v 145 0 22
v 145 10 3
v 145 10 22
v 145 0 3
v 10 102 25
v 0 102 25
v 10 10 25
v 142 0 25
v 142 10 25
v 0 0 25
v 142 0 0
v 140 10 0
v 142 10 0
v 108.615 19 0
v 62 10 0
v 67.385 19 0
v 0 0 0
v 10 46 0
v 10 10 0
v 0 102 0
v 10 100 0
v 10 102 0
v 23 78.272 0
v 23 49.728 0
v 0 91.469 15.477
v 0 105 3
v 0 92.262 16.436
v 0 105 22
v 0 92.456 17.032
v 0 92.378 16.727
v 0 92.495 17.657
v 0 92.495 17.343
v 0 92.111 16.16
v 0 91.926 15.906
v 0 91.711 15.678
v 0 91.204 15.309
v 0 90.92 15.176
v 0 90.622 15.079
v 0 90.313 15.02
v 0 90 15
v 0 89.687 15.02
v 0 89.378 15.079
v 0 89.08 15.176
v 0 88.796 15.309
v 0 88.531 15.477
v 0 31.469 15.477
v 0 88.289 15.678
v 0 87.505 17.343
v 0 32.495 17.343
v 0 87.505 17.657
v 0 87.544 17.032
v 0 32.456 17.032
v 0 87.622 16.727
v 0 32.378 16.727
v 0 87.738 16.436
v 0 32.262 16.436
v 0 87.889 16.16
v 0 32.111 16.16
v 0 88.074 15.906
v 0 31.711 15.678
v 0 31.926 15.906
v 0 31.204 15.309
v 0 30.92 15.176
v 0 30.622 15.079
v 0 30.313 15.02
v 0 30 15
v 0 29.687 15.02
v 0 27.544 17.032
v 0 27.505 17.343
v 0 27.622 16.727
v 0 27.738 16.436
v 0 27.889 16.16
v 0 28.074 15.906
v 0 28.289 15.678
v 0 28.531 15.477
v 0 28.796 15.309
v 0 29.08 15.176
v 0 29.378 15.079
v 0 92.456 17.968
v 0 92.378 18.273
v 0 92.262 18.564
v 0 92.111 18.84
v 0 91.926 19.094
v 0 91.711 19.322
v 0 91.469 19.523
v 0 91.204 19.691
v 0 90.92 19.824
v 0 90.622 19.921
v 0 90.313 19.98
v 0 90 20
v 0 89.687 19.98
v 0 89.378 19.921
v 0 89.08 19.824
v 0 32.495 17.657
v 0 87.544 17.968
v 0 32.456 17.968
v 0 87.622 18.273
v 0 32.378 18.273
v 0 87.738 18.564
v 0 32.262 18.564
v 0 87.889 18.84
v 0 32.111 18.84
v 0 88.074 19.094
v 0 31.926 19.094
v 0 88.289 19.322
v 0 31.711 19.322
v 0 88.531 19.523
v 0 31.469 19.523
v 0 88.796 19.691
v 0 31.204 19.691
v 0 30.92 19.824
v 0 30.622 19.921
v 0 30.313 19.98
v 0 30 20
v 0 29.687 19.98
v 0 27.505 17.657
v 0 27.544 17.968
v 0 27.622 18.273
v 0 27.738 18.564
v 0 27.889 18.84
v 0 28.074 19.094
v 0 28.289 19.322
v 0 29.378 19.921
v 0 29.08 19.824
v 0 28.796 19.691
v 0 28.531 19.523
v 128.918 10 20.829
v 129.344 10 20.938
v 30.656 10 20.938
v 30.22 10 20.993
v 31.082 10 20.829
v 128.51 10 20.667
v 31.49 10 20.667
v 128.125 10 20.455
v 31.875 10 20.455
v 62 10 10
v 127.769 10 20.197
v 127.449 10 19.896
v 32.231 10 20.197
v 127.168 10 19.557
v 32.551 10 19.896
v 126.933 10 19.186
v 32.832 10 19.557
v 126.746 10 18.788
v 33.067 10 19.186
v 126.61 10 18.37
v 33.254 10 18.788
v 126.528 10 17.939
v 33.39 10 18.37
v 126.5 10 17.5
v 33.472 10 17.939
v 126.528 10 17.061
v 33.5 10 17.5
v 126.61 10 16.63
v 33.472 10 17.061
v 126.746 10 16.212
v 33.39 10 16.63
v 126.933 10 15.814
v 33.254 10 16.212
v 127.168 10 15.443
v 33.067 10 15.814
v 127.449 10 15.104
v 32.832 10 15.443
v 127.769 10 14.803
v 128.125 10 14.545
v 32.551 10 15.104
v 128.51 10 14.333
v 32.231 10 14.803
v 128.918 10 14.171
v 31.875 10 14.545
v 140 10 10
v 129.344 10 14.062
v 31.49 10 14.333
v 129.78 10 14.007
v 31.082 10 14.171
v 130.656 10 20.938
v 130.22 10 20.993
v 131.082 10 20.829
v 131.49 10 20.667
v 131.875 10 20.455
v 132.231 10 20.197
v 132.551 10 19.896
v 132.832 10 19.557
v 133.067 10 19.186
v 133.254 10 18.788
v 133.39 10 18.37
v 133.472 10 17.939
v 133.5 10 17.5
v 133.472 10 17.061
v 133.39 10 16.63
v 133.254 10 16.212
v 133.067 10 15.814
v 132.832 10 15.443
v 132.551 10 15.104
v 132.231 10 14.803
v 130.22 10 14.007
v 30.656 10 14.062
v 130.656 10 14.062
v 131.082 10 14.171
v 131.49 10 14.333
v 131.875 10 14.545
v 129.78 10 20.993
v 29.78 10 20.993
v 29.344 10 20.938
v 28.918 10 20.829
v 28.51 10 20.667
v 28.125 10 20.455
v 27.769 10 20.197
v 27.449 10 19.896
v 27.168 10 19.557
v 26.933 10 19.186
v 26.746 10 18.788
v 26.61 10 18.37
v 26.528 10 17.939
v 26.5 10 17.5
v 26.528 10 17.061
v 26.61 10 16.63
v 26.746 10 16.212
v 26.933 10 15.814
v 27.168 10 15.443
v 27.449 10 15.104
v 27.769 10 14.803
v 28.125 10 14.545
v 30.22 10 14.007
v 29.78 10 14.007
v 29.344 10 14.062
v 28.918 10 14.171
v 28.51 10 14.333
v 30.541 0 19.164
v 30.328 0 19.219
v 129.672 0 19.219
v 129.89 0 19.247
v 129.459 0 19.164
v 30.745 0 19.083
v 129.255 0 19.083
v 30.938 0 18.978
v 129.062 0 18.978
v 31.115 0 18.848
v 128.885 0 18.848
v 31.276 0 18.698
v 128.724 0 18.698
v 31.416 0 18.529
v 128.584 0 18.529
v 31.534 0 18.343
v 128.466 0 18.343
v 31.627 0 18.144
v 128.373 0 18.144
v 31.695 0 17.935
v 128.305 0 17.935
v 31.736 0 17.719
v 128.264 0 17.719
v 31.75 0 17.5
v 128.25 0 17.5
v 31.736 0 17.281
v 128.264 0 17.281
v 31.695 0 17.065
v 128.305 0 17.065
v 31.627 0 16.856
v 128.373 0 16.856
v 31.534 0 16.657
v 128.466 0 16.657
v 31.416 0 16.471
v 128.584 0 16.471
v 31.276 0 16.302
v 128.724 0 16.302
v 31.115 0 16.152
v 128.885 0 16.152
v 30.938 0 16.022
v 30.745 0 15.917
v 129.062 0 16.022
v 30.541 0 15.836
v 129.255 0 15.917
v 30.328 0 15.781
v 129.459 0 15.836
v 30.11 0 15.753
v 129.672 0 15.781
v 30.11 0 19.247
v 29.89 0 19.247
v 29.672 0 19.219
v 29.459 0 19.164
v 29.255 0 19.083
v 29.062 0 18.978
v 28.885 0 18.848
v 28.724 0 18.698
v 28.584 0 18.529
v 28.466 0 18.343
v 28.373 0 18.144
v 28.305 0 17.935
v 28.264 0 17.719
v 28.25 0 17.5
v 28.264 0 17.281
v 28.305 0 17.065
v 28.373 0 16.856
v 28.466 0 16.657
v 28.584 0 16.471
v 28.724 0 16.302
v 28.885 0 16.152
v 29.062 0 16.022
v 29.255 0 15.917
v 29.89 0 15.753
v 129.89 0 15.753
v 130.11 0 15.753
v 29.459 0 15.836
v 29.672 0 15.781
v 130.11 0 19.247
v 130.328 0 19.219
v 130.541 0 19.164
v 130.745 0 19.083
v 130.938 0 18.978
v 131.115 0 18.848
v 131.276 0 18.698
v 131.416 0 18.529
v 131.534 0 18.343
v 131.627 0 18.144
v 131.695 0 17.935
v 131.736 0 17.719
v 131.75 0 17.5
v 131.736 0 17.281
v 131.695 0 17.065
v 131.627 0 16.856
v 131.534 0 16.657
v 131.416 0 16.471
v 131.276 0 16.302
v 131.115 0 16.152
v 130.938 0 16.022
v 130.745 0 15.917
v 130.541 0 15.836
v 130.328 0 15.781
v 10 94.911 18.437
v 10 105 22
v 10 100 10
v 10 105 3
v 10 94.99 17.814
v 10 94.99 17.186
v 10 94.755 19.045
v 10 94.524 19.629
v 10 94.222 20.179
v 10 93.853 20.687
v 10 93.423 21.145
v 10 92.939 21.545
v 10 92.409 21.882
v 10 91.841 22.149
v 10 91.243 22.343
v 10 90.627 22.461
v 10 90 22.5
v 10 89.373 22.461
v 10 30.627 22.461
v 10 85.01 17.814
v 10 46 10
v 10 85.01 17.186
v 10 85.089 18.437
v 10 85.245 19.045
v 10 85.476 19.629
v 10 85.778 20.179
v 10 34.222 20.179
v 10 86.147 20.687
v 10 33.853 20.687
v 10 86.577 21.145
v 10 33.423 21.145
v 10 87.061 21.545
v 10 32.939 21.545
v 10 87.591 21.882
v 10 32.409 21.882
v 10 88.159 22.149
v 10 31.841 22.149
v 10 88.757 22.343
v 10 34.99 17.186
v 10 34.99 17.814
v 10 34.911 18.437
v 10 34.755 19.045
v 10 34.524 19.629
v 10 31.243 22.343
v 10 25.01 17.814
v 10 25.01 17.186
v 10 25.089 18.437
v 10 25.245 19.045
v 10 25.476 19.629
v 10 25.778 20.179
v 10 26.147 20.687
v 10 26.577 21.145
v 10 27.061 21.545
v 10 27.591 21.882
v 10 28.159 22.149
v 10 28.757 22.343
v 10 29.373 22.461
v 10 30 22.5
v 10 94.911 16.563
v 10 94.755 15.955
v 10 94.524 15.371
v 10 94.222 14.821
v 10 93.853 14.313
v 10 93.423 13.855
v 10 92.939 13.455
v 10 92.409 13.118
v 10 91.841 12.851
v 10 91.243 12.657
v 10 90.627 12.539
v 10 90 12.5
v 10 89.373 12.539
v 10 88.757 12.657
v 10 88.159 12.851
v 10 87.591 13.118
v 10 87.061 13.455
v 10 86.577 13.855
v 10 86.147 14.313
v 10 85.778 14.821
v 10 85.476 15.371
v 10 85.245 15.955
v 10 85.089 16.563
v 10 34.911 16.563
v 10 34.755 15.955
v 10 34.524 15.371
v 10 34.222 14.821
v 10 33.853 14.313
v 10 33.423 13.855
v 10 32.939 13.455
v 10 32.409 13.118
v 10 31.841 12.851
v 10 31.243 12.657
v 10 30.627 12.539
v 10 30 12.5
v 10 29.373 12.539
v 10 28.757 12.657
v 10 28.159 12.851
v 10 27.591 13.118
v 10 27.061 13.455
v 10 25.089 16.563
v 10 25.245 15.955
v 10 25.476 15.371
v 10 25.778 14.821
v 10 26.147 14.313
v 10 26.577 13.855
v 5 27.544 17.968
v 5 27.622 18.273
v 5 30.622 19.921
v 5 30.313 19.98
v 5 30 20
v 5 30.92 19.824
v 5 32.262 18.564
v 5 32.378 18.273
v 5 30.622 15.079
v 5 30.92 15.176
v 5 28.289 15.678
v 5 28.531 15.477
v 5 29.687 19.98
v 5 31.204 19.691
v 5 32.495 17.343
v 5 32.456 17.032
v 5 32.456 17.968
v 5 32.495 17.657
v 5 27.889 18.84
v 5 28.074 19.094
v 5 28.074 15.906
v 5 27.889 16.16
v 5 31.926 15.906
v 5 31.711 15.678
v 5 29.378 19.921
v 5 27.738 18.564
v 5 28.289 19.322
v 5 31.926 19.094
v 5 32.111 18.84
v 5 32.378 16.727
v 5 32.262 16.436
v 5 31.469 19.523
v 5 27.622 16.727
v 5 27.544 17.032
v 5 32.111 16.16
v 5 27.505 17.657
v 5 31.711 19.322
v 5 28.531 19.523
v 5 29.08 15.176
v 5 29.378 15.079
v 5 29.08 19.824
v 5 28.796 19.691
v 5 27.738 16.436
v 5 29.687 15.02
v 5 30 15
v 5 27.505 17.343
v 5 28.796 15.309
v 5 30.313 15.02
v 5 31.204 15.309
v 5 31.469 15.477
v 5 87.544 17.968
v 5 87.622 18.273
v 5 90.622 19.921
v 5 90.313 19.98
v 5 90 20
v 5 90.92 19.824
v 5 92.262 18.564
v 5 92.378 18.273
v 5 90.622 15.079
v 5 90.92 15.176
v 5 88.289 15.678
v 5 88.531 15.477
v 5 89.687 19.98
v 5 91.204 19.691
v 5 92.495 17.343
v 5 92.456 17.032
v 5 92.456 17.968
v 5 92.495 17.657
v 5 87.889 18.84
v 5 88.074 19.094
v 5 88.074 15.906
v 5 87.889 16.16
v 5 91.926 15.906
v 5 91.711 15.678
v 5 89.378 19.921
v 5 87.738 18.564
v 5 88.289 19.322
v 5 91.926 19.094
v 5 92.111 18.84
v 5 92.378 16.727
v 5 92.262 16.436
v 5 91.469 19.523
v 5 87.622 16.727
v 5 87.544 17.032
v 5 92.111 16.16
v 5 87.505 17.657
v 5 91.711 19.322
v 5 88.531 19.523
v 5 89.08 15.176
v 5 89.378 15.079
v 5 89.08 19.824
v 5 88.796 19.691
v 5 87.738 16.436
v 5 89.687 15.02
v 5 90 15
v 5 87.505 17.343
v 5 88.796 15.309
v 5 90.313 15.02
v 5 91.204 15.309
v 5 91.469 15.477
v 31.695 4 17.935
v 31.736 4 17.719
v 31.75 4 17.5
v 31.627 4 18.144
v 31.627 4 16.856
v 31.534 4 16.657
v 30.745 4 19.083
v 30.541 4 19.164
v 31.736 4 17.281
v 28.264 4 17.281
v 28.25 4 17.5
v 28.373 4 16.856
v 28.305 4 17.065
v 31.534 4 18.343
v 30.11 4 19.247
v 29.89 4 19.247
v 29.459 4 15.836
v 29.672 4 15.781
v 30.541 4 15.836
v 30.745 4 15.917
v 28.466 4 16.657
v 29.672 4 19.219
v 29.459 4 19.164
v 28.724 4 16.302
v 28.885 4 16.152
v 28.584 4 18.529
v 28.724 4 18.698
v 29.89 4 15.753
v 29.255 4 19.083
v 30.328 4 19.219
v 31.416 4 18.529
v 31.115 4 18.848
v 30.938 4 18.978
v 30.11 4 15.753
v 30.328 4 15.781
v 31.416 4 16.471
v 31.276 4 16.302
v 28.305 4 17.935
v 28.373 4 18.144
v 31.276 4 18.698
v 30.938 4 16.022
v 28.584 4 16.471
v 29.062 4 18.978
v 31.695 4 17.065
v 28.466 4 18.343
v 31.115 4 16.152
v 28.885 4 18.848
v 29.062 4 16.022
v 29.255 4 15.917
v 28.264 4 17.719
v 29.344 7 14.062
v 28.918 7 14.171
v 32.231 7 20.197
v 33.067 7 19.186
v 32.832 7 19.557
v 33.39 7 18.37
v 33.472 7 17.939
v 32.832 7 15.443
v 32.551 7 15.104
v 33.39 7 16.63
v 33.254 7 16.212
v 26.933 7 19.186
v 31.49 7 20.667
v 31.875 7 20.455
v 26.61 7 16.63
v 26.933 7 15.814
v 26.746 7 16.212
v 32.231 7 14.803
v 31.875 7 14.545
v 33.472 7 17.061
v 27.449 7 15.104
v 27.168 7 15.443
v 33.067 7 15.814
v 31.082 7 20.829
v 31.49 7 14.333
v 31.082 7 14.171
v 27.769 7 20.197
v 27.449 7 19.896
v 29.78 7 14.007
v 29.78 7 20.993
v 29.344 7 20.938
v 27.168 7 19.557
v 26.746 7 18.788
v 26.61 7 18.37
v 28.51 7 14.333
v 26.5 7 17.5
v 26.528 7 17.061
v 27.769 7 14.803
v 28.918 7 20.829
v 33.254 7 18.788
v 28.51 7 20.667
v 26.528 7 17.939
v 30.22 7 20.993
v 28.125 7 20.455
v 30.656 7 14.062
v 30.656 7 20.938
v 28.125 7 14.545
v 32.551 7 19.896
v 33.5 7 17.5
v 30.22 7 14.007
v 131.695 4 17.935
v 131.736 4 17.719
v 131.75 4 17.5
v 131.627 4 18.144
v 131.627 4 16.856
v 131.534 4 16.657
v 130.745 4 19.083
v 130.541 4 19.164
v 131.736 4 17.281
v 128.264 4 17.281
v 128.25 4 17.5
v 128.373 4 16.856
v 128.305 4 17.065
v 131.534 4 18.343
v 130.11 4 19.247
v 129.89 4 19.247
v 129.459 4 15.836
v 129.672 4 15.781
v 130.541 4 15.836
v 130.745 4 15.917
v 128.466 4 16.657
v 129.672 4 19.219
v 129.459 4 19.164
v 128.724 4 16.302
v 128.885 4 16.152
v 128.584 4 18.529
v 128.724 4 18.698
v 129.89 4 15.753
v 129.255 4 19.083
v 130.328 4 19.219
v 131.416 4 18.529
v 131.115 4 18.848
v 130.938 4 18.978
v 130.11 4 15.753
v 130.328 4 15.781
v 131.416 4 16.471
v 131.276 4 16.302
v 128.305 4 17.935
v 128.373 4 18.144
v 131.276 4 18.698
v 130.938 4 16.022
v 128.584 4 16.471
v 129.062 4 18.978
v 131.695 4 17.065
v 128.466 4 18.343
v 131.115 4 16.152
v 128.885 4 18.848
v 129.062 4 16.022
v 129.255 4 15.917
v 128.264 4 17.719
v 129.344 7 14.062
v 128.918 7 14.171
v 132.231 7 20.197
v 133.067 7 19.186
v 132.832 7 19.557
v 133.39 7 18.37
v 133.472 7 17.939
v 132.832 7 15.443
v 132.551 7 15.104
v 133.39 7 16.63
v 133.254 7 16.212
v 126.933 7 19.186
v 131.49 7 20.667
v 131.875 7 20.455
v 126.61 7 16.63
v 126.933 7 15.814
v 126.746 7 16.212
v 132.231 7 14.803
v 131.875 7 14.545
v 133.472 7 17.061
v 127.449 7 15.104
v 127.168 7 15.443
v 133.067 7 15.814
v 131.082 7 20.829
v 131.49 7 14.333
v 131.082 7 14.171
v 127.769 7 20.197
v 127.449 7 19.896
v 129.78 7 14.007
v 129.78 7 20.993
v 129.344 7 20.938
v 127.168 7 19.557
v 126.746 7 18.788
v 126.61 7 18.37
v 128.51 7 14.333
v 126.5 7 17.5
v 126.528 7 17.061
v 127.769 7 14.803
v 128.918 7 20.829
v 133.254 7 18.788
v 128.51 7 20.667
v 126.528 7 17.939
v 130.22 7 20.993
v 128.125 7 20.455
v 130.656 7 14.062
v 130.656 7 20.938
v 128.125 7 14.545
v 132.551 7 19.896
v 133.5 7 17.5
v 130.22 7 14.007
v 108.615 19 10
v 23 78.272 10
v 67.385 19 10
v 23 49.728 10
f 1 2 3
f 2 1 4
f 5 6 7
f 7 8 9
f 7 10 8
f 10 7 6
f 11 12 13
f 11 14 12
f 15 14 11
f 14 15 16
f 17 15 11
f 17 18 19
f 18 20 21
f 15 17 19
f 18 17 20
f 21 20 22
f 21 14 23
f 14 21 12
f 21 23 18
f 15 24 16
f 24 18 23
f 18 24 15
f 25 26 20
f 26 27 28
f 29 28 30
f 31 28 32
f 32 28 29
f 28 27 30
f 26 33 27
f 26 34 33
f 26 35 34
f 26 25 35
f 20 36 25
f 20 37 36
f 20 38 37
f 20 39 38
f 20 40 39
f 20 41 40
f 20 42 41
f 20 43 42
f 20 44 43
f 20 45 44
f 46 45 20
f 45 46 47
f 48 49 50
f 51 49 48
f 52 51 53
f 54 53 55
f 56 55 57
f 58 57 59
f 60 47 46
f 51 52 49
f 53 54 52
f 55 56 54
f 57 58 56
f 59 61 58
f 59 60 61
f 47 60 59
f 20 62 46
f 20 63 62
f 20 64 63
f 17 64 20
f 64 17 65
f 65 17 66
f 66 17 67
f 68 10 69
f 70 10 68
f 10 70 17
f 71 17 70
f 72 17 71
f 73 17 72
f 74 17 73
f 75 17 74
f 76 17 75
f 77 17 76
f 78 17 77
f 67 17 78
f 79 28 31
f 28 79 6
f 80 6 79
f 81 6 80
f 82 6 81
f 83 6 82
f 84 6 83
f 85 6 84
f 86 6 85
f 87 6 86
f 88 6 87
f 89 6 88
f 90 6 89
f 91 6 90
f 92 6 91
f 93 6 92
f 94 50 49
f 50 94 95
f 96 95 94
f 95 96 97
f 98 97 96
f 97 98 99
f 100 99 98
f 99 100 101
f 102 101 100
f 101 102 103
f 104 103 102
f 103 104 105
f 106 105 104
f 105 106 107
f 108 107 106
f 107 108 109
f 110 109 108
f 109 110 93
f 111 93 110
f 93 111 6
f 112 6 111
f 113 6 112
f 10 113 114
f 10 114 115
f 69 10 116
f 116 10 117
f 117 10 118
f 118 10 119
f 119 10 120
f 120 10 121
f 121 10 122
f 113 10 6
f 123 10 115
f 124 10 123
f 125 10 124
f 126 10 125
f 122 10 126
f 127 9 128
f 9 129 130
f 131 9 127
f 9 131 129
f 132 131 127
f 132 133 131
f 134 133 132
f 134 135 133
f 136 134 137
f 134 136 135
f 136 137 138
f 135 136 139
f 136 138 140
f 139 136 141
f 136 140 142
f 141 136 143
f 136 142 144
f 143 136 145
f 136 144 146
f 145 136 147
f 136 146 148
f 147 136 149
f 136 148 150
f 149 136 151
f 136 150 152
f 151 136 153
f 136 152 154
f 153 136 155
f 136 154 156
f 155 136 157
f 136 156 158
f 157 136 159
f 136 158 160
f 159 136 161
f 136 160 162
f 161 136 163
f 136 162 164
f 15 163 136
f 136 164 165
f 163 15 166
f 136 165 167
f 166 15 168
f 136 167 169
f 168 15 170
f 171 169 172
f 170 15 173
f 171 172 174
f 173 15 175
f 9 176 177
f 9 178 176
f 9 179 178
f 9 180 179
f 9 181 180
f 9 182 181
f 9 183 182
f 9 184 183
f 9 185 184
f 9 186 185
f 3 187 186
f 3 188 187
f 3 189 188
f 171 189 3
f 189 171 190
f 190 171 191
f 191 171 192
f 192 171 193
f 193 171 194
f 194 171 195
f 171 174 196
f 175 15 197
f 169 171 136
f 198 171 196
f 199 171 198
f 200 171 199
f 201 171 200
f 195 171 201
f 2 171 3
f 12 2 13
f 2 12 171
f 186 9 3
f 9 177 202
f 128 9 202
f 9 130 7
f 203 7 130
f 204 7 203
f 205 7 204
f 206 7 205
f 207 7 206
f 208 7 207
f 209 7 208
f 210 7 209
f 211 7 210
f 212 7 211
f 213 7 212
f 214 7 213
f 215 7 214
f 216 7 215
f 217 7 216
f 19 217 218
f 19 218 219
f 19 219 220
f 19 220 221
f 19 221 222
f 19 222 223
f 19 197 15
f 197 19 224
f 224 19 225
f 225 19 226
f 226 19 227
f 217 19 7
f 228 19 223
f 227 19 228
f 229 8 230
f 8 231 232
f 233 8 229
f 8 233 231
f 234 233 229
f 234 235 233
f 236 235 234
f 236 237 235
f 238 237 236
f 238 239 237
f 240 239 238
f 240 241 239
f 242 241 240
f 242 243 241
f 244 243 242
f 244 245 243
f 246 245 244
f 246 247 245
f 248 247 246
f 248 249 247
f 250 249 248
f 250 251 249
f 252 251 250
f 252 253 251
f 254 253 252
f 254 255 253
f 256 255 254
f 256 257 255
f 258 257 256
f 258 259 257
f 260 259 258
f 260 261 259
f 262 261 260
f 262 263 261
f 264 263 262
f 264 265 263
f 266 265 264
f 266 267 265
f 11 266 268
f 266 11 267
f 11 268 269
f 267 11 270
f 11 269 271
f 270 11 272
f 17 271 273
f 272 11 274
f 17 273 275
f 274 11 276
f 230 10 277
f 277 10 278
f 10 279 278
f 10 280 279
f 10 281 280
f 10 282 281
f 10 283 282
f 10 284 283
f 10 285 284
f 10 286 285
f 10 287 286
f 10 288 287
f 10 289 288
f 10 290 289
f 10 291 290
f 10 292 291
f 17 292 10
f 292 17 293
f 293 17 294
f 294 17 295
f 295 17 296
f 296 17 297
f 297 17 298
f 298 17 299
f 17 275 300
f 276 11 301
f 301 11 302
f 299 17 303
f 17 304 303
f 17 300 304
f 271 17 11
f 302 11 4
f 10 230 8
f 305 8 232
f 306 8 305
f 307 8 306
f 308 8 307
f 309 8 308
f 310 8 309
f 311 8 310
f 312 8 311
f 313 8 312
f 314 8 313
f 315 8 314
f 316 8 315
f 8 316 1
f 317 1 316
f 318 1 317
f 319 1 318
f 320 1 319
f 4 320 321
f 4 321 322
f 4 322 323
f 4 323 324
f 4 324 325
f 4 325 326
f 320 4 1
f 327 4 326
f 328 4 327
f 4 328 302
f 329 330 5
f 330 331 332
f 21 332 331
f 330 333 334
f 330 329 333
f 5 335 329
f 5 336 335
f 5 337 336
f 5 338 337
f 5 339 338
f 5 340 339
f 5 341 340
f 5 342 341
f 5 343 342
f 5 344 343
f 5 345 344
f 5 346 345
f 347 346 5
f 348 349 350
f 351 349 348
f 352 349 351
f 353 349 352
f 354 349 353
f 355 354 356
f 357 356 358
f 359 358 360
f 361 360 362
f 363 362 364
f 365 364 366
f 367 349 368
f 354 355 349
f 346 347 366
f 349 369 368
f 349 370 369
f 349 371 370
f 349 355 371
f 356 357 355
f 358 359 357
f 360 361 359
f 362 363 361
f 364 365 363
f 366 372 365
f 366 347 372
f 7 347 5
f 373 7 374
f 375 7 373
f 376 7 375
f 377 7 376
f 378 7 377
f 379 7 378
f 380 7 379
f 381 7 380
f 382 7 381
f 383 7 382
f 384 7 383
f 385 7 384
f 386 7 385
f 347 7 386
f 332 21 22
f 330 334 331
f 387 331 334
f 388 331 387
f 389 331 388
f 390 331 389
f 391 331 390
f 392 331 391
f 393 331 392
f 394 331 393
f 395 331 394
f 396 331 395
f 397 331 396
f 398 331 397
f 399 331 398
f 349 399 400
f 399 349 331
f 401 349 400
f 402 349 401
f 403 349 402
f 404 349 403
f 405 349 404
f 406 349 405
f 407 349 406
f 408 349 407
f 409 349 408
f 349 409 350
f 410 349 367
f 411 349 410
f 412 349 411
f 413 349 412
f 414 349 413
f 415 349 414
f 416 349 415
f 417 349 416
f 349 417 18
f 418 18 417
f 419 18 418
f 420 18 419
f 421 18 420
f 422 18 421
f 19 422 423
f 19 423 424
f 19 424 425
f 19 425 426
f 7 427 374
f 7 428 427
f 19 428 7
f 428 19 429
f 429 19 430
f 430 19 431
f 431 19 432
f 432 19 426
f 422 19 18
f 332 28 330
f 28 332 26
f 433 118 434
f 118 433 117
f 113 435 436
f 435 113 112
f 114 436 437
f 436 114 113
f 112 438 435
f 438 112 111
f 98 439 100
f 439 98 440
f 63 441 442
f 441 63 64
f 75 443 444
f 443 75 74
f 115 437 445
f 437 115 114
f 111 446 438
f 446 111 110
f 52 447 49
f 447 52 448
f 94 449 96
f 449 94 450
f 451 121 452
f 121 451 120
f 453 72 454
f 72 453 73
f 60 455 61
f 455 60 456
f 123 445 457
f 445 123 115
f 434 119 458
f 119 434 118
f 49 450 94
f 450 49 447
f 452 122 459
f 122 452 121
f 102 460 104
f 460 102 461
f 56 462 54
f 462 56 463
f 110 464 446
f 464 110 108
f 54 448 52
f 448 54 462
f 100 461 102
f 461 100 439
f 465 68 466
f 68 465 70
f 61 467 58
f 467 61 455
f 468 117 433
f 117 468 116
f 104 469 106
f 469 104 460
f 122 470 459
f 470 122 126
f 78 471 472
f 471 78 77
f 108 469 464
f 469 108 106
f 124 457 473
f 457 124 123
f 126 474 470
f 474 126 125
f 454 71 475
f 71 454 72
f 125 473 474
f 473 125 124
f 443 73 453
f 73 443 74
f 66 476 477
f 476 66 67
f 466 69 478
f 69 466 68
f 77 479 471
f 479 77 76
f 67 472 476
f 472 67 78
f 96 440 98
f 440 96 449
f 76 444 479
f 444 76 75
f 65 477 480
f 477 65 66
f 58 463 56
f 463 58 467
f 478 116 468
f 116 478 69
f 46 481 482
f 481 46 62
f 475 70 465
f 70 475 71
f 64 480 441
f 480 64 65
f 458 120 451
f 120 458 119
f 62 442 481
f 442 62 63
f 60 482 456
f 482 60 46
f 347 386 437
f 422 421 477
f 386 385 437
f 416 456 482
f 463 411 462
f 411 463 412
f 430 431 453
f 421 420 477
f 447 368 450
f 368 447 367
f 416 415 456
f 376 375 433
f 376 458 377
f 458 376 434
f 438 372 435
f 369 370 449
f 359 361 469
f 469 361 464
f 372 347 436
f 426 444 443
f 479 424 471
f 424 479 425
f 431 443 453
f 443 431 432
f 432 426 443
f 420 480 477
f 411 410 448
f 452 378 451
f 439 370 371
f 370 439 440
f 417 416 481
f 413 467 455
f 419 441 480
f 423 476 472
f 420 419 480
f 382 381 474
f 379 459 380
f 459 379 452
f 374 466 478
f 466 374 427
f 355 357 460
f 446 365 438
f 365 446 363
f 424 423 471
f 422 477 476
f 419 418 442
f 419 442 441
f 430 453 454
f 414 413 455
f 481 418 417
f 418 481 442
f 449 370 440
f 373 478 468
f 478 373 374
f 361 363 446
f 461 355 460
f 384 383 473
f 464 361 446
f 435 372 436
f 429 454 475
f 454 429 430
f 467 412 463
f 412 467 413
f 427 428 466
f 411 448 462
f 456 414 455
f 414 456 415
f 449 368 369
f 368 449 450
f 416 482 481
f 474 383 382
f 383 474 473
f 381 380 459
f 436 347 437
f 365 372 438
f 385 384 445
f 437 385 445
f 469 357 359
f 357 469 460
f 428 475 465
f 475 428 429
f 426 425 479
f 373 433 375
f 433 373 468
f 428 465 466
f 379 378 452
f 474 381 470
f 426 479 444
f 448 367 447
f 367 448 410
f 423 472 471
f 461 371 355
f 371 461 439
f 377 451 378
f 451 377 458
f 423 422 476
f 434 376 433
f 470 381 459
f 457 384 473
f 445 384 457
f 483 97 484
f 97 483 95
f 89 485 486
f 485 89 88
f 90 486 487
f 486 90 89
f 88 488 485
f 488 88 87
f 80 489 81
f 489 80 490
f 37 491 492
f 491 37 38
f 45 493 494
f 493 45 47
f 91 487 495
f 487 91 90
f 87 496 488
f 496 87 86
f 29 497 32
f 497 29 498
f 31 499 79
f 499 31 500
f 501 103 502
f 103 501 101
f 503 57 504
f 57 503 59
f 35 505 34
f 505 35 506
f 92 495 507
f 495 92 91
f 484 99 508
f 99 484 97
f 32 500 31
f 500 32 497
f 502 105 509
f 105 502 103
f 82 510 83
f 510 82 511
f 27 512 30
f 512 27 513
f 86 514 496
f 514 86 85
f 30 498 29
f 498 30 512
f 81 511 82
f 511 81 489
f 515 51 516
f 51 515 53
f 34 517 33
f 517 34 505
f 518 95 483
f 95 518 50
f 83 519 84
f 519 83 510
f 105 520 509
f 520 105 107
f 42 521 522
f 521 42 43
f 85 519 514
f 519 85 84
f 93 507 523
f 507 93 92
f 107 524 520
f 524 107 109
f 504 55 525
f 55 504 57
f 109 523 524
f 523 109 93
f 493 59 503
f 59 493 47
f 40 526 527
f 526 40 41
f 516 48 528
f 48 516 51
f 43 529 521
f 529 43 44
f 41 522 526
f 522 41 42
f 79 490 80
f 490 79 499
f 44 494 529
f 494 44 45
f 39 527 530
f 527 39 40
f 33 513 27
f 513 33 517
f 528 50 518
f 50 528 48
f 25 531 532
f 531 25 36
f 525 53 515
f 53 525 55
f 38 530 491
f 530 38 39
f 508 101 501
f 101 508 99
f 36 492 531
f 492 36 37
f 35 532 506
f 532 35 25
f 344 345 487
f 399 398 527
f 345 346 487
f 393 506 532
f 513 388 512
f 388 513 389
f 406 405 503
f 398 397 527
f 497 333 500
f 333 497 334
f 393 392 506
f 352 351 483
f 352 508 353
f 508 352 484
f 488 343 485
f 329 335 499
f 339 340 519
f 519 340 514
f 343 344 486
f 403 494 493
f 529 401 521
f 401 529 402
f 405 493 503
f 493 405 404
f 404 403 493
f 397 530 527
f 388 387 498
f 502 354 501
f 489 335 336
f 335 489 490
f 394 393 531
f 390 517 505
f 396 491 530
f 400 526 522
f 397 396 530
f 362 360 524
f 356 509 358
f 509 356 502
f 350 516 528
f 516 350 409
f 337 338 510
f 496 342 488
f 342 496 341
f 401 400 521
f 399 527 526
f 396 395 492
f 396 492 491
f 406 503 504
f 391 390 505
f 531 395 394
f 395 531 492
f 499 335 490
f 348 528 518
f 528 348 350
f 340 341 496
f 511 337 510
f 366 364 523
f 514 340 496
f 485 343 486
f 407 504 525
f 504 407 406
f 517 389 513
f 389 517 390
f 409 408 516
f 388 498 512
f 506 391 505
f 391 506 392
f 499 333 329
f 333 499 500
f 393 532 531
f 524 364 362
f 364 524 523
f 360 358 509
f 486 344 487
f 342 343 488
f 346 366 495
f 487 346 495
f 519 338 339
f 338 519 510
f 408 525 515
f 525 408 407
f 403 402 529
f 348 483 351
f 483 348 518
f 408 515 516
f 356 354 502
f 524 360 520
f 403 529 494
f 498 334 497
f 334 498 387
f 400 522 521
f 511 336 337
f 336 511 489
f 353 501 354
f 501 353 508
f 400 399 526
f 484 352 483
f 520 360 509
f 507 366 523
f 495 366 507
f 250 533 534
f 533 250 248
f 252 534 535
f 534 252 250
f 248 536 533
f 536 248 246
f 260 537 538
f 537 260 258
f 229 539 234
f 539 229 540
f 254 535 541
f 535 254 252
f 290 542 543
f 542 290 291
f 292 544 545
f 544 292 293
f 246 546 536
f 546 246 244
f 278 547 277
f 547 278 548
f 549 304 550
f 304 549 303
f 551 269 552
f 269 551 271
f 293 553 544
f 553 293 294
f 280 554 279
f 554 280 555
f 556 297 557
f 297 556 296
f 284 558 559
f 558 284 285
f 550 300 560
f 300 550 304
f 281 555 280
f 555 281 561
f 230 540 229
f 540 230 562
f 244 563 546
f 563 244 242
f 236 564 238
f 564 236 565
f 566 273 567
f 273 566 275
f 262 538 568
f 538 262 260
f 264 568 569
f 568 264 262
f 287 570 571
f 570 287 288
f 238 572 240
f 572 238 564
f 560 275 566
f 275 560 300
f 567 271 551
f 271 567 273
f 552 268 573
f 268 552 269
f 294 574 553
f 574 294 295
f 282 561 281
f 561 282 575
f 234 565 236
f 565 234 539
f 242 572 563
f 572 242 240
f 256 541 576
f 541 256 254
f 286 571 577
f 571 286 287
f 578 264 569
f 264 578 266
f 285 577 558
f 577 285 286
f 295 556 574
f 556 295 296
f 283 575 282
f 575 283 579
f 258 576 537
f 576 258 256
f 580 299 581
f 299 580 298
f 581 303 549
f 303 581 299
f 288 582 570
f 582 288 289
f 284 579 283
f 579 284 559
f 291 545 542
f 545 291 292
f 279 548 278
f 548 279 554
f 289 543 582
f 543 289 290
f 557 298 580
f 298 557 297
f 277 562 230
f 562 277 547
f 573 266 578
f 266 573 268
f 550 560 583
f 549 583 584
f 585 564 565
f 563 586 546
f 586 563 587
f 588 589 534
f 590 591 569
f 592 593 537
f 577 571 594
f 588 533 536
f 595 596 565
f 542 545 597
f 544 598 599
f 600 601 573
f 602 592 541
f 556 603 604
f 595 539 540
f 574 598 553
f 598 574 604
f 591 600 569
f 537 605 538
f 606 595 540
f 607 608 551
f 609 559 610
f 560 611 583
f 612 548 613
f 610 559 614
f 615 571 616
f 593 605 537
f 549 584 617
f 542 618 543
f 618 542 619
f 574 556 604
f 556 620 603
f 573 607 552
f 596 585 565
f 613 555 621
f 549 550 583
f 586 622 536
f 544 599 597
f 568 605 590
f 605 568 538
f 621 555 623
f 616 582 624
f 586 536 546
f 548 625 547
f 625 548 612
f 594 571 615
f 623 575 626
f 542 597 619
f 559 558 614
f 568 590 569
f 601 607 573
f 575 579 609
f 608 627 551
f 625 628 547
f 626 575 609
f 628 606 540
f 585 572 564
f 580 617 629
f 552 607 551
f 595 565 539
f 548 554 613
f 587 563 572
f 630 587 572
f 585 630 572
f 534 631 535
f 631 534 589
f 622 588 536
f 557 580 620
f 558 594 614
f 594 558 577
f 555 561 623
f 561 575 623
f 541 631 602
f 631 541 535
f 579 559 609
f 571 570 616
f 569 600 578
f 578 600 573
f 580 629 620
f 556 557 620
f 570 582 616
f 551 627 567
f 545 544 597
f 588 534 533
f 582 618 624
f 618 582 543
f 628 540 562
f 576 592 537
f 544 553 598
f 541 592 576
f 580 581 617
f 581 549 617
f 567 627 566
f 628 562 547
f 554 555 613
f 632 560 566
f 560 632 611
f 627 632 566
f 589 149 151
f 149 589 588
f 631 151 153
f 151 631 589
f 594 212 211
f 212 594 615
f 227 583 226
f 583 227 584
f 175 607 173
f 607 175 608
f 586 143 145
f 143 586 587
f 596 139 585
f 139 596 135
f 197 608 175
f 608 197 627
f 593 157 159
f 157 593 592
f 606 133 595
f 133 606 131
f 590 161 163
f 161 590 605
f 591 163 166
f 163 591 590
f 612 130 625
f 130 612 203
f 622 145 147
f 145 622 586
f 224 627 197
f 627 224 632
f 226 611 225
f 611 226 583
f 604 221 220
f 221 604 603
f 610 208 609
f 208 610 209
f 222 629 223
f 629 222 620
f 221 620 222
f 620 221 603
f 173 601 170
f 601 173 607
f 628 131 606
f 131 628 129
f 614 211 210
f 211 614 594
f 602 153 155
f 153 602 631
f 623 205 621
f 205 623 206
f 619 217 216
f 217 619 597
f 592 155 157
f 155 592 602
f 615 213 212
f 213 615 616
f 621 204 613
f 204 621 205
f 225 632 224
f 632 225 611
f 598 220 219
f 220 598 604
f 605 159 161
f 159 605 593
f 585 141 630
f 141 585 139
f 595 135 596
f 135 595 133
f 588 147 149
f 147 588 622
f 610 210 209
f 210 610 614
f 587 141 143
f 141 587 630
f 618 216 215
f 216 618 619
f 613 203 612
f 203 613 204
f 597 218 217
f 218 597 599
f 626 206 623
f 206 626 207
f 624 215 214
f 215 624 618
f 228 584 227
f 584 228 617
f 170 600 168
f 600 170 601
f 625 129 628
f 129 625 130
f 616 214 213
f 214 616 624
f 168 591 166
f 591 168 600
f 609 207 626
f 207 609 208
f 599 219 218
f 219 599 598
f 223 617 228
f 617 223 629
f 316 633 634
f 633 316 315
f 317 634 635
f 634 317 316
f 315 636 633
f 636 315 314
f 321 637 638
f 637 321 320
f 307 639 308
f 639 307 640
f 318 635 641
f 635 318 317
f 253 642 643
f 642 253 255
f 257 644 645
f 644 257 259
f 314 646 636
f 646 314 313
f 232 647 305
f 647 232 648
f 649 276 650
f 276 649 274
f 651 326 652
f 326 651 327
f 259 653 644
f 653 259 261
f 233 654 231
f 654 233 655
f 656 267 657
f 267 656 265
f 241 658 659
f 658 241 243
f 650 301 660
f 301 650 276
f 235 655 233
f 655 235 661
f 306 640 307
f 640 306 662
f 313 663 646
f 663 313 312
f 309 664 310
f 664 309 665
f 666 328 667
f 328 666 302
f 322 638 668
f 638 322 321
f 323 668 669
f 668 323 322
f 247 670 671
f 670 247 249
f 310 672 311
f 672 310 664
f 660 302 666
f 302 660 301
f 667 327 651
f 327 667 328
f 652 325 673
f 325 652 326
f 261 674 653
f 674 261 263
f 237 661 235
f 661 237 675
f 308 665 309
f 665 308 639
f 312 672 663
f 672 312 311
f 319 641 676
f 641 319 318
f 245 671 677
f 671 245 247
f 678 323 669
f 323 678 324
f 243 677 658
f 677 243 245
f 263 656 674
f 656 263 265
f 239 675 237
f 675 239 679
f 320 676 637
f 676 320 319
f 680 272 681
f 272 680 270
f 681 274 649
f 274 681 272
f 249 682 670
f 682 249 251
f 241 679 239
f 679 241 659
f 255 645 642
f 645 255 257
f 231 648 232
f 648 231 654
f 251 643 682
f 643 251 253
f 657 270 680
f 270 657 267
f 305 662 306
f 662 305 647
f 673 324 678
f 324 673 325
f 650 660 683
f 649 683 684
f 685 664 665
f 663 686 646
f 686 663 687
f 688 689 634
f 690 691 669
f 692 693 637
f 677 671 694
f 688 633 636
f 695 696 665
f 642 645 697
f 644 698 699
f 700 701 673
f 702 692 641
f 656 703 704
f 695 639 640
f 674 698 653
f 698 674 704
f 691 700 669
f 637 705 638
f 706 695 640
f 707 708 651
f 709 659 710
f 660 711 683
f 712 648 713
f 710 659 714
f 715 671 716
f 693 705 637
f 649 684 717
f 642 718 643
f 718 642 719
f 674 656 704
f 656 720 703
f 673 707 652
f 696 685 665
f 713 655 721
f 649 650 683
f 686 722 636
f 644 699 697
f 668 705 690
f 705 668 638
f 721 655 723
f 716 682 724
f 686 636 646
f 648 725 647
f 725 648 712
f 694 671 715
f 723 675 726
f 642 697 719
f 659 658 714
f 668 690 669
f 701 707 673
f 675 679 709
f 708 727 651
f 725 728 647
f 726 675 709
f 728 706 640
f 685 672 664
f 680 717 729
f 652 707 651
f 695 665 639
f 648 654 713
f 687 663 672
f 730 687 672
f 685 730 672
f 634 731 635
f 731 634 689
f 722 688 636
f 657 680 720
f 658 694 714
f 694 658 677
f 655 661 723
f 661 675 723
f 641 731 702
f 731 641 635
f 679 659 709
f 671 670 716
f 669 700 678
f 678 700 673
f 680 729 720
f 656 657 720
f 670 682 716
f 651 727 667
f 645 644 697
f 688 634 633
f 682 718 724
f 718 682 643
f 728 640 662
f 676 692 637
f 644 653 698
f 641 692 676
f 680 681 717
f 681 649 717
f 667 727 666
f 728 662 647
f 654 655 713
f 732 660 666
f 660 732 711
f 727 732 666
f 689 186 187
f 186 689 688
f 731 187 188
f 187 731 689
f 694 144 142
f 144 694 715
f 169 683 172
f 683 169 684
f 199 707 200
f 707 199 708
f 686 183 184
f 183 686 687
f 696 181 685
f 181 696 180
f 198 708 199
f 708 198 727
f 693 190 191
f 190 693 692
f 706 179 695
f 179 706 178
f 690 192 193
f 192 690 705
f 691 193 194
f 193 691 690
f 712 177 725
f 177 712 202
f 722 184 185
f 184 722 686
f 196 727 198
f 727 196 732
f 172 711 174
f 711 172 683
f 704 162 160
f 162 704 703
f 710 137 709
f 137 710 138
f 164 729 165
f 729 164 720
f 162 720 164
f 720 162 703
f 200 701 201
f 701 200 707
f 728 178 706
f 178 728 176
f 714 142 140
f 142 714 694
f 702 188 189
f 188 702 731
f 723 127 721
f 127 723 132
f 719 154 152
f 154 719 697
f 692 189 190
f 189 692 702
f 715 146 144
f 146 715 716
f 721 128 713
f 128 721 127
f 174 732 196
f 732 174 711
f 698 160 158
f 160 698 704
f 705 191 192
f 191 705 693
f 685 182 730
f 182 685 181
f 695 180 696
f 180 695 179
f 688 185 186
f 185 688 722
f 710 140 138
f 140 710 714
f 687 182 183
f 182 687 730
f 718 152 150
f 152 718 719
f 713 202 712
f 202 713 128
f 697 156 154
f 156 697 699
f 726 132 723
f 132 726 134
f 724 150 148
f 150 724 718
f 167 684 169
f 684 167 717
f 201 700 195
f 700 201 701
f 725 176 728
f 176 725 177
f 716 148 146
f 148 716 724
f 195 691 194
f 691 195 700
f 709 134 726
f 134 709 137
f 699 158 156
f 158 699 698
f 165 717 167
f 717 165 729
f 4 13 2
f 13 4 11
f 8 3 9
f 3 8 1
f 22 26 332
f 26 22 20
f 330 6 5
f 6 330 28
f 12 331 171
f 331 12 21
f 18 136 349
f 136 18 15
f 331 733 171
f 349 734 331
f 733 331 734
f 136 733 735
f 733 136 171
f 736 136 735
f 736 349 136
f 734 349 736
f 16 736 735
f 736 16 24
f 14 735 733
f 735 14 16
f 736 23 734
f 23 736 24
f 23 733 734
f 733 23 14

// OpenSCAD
/* shelfbracket.scad
Author: andimoto@posteo.de
*/


$fn=50;

points = [
  [4,0],
  [10,0],
  [0,10],
  [0,4]
];


shelfLen = 145;
wallLen = 105;
bracketWidth = 25;
bracketThickness = 10;

wallScrewDia = 5;
shelfScrewDia = 3.5;

cutEdges = true;
edgeShiftShelf = 3;
edgeShiftWall = 3;




module screw(screwDia,len)
{
  cylinder(r=screwDia/2, h=len);
  cylinder(r1=screwDia,r2=screwDia/2,h=5);
}

module screw2(screwDia,len)
{
  cylinder(r=screwDia/2, h=len);
  translate([0,0,3]) cylinder(r1=screwDia,r2=screwDia/2,h=3);
  cylinder(r=screwDia, h=3);
}



module bracket(l1,l2,wall,h)
{
  difference()
  {
    union()
    {
      cube([l1,wall,h]);
      cube([wall,l2,h]);
    }
    translate([10,30,10+(25-10)/2]) rotate([0,-90,0]) screw(wallScrewDia,wall+5);
    translate([10,90,10+(25-10)/2]) rotate([0,-90,0]) screw(wallScrewDia,wall+5);

    translate([30,10,10+(25-10)/2]) rotate([90,0,0]) screw2(shelfScrewDia,bracketThickness);
    translate([130,10,10+(25-10)/2]) rotate([90,0,0]) screw2(shelfScrewDia,bracketThickness);
  }
}

module shelfbracket()
{
  difference() {
    bracket(shelfLen,wallLen,bracketThickness,bracketWidth);

    if(cutEdges == true)
    {
      translate([shelfLen-edgeShiftShelf,0,0]) rotate([0,45,0])
        cube([bracketWidth,bracketThickness,bracketWidth]);
      translate([shelfLen-edgeShiftShelf,0,bracketWidth]) rotate([0,45,0])
        cube([bracketWidth,bracketThickness,bracketWidth]);

      translate([0,wallLen-edgeShiftWall,0]) rotate([-45,0,0])
        cube([bracketThickness,bracketWidth,bracketWidth]);
      translate([0,wallLen-edgeShiftWall,bracketWidth]) rotate([-45,0,0])
        cube([bracketThickness,bracketWidth,bracketWidth]);
    }
  };

  translate([10,10,0])
  scale([13,9,1])
  difference() {
    linear_extrude(height = 10, center = false, convexity = 0, twist = 0)
      polygon(points);
    linear_extrude(height = 10, center = false, convexity = 0, twist = 0)
      offset(delta = -1) polygon(points);
  };

}

/* */
shelfbracket();
